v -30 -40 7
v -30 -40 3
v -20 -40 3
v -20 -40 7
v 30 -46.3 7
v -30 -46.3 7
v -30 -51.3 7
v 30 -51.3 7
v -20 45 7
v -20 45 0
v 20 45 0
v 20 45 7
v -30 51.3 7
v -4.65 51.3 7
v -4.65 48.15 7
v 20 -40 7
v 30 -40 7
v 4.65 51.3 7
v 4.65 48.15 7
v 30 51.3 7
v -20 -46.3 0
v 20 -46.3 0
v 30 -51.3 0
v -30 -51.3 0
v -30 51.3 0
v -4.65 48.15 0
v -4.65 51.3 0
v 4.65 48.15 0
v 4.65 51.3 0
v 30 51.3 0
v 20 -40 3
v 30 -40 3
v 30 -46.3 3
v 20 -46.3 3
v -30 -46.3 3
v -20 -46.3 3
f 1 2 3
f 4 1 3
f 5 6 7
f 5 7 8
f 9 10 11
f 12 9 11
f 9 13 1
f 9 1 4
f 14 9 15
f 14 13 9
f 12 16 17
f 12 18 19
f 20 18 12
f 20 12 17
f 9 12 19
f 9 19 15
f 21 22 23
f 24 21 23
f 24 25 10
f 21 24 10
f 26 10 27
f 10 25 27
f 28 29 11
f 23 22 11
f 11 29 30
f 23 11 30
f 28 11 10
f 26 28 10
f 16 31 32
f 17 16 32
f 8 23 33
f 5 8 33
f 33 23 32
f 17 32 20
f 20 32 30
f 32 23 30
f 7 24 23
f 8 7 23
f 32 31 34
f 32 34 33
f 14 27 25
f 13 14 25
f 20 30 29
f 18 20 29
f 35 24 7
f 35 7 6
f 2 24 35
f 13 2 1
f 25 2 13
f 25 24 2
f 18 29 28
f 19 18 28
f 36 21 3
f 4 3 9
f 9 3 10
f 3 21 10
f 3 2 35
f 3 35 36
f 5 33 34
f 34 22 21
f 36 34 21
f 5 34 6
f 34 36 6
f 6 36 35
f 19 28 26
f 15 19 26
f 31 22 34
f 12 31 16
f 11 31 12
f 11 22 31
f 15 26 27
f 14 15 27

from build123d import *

# Parameters (mm, degrees)
F0_W     = 10
F0_H     = 85
F1_DEPTH = 7
F0_H_2   = 5
F0_H_3   = 6.3
F2_DEPTH = 3


with BuildPart() as f1:
    # F0 (on Top) → F1 (new body)
    with BuildSketch(Plane.XY):
        with Locations((25, 2.5)):
            Rectangle(F0_W, F0_H)
        Polygon((20, 45), (30, 45), (30, 51.3), (4.65, 51.3), (4.65, 48.15), (4.65, 45), align=None)
        Polygon((-30, 45), (-20, 45), (-4.65, 45), (-4.65, 48.15), (-4.65, 51.3), (-30, 51.3), align=None)
        with Locations((-25, 2.5)):
            Rectangle(F0_W, F0_H)
        Polygon((0, 45), (4.65, 45), (4.65, 48.15), (-4.65, 48.15), (-4.65, 45), align=None)
    extrude(amount=F1_DEPTH)



with BuildPart() as f1b:
    # F0 (on Top) → F1, piece 2 (new body)
    with BuildSketch(Plane.XY):
        with Locations((-25, -48.8)):
            Rectangle(F0_W, F0_H_2)
        Polygon((-20, -51.3), (20, -51.3), (20, -46.3), (0, -46.3), (-20, -46.3), align=None)
        with Locations((25, -48.8)):
            Rectangle(F0_W, F0_H_2)
    extrude(amount=F1_DEPTH)


with BuildPart() as f1_1:
    add(f1.part)

    add(f1b.part)  # F2 merges F1b
    # F0 (on Top) → F2 (join)
    with BuildSketch(Plane.XY):
        with Locations((25, -43.15)):
            Rectangle(F0_W, F0_H_3)
        with Locations((-25, -43.15)):
            Rectangle(F0_W, F0_H_3)
    extrude(amount=F2_DEPTH)


solid = f1_1.part
